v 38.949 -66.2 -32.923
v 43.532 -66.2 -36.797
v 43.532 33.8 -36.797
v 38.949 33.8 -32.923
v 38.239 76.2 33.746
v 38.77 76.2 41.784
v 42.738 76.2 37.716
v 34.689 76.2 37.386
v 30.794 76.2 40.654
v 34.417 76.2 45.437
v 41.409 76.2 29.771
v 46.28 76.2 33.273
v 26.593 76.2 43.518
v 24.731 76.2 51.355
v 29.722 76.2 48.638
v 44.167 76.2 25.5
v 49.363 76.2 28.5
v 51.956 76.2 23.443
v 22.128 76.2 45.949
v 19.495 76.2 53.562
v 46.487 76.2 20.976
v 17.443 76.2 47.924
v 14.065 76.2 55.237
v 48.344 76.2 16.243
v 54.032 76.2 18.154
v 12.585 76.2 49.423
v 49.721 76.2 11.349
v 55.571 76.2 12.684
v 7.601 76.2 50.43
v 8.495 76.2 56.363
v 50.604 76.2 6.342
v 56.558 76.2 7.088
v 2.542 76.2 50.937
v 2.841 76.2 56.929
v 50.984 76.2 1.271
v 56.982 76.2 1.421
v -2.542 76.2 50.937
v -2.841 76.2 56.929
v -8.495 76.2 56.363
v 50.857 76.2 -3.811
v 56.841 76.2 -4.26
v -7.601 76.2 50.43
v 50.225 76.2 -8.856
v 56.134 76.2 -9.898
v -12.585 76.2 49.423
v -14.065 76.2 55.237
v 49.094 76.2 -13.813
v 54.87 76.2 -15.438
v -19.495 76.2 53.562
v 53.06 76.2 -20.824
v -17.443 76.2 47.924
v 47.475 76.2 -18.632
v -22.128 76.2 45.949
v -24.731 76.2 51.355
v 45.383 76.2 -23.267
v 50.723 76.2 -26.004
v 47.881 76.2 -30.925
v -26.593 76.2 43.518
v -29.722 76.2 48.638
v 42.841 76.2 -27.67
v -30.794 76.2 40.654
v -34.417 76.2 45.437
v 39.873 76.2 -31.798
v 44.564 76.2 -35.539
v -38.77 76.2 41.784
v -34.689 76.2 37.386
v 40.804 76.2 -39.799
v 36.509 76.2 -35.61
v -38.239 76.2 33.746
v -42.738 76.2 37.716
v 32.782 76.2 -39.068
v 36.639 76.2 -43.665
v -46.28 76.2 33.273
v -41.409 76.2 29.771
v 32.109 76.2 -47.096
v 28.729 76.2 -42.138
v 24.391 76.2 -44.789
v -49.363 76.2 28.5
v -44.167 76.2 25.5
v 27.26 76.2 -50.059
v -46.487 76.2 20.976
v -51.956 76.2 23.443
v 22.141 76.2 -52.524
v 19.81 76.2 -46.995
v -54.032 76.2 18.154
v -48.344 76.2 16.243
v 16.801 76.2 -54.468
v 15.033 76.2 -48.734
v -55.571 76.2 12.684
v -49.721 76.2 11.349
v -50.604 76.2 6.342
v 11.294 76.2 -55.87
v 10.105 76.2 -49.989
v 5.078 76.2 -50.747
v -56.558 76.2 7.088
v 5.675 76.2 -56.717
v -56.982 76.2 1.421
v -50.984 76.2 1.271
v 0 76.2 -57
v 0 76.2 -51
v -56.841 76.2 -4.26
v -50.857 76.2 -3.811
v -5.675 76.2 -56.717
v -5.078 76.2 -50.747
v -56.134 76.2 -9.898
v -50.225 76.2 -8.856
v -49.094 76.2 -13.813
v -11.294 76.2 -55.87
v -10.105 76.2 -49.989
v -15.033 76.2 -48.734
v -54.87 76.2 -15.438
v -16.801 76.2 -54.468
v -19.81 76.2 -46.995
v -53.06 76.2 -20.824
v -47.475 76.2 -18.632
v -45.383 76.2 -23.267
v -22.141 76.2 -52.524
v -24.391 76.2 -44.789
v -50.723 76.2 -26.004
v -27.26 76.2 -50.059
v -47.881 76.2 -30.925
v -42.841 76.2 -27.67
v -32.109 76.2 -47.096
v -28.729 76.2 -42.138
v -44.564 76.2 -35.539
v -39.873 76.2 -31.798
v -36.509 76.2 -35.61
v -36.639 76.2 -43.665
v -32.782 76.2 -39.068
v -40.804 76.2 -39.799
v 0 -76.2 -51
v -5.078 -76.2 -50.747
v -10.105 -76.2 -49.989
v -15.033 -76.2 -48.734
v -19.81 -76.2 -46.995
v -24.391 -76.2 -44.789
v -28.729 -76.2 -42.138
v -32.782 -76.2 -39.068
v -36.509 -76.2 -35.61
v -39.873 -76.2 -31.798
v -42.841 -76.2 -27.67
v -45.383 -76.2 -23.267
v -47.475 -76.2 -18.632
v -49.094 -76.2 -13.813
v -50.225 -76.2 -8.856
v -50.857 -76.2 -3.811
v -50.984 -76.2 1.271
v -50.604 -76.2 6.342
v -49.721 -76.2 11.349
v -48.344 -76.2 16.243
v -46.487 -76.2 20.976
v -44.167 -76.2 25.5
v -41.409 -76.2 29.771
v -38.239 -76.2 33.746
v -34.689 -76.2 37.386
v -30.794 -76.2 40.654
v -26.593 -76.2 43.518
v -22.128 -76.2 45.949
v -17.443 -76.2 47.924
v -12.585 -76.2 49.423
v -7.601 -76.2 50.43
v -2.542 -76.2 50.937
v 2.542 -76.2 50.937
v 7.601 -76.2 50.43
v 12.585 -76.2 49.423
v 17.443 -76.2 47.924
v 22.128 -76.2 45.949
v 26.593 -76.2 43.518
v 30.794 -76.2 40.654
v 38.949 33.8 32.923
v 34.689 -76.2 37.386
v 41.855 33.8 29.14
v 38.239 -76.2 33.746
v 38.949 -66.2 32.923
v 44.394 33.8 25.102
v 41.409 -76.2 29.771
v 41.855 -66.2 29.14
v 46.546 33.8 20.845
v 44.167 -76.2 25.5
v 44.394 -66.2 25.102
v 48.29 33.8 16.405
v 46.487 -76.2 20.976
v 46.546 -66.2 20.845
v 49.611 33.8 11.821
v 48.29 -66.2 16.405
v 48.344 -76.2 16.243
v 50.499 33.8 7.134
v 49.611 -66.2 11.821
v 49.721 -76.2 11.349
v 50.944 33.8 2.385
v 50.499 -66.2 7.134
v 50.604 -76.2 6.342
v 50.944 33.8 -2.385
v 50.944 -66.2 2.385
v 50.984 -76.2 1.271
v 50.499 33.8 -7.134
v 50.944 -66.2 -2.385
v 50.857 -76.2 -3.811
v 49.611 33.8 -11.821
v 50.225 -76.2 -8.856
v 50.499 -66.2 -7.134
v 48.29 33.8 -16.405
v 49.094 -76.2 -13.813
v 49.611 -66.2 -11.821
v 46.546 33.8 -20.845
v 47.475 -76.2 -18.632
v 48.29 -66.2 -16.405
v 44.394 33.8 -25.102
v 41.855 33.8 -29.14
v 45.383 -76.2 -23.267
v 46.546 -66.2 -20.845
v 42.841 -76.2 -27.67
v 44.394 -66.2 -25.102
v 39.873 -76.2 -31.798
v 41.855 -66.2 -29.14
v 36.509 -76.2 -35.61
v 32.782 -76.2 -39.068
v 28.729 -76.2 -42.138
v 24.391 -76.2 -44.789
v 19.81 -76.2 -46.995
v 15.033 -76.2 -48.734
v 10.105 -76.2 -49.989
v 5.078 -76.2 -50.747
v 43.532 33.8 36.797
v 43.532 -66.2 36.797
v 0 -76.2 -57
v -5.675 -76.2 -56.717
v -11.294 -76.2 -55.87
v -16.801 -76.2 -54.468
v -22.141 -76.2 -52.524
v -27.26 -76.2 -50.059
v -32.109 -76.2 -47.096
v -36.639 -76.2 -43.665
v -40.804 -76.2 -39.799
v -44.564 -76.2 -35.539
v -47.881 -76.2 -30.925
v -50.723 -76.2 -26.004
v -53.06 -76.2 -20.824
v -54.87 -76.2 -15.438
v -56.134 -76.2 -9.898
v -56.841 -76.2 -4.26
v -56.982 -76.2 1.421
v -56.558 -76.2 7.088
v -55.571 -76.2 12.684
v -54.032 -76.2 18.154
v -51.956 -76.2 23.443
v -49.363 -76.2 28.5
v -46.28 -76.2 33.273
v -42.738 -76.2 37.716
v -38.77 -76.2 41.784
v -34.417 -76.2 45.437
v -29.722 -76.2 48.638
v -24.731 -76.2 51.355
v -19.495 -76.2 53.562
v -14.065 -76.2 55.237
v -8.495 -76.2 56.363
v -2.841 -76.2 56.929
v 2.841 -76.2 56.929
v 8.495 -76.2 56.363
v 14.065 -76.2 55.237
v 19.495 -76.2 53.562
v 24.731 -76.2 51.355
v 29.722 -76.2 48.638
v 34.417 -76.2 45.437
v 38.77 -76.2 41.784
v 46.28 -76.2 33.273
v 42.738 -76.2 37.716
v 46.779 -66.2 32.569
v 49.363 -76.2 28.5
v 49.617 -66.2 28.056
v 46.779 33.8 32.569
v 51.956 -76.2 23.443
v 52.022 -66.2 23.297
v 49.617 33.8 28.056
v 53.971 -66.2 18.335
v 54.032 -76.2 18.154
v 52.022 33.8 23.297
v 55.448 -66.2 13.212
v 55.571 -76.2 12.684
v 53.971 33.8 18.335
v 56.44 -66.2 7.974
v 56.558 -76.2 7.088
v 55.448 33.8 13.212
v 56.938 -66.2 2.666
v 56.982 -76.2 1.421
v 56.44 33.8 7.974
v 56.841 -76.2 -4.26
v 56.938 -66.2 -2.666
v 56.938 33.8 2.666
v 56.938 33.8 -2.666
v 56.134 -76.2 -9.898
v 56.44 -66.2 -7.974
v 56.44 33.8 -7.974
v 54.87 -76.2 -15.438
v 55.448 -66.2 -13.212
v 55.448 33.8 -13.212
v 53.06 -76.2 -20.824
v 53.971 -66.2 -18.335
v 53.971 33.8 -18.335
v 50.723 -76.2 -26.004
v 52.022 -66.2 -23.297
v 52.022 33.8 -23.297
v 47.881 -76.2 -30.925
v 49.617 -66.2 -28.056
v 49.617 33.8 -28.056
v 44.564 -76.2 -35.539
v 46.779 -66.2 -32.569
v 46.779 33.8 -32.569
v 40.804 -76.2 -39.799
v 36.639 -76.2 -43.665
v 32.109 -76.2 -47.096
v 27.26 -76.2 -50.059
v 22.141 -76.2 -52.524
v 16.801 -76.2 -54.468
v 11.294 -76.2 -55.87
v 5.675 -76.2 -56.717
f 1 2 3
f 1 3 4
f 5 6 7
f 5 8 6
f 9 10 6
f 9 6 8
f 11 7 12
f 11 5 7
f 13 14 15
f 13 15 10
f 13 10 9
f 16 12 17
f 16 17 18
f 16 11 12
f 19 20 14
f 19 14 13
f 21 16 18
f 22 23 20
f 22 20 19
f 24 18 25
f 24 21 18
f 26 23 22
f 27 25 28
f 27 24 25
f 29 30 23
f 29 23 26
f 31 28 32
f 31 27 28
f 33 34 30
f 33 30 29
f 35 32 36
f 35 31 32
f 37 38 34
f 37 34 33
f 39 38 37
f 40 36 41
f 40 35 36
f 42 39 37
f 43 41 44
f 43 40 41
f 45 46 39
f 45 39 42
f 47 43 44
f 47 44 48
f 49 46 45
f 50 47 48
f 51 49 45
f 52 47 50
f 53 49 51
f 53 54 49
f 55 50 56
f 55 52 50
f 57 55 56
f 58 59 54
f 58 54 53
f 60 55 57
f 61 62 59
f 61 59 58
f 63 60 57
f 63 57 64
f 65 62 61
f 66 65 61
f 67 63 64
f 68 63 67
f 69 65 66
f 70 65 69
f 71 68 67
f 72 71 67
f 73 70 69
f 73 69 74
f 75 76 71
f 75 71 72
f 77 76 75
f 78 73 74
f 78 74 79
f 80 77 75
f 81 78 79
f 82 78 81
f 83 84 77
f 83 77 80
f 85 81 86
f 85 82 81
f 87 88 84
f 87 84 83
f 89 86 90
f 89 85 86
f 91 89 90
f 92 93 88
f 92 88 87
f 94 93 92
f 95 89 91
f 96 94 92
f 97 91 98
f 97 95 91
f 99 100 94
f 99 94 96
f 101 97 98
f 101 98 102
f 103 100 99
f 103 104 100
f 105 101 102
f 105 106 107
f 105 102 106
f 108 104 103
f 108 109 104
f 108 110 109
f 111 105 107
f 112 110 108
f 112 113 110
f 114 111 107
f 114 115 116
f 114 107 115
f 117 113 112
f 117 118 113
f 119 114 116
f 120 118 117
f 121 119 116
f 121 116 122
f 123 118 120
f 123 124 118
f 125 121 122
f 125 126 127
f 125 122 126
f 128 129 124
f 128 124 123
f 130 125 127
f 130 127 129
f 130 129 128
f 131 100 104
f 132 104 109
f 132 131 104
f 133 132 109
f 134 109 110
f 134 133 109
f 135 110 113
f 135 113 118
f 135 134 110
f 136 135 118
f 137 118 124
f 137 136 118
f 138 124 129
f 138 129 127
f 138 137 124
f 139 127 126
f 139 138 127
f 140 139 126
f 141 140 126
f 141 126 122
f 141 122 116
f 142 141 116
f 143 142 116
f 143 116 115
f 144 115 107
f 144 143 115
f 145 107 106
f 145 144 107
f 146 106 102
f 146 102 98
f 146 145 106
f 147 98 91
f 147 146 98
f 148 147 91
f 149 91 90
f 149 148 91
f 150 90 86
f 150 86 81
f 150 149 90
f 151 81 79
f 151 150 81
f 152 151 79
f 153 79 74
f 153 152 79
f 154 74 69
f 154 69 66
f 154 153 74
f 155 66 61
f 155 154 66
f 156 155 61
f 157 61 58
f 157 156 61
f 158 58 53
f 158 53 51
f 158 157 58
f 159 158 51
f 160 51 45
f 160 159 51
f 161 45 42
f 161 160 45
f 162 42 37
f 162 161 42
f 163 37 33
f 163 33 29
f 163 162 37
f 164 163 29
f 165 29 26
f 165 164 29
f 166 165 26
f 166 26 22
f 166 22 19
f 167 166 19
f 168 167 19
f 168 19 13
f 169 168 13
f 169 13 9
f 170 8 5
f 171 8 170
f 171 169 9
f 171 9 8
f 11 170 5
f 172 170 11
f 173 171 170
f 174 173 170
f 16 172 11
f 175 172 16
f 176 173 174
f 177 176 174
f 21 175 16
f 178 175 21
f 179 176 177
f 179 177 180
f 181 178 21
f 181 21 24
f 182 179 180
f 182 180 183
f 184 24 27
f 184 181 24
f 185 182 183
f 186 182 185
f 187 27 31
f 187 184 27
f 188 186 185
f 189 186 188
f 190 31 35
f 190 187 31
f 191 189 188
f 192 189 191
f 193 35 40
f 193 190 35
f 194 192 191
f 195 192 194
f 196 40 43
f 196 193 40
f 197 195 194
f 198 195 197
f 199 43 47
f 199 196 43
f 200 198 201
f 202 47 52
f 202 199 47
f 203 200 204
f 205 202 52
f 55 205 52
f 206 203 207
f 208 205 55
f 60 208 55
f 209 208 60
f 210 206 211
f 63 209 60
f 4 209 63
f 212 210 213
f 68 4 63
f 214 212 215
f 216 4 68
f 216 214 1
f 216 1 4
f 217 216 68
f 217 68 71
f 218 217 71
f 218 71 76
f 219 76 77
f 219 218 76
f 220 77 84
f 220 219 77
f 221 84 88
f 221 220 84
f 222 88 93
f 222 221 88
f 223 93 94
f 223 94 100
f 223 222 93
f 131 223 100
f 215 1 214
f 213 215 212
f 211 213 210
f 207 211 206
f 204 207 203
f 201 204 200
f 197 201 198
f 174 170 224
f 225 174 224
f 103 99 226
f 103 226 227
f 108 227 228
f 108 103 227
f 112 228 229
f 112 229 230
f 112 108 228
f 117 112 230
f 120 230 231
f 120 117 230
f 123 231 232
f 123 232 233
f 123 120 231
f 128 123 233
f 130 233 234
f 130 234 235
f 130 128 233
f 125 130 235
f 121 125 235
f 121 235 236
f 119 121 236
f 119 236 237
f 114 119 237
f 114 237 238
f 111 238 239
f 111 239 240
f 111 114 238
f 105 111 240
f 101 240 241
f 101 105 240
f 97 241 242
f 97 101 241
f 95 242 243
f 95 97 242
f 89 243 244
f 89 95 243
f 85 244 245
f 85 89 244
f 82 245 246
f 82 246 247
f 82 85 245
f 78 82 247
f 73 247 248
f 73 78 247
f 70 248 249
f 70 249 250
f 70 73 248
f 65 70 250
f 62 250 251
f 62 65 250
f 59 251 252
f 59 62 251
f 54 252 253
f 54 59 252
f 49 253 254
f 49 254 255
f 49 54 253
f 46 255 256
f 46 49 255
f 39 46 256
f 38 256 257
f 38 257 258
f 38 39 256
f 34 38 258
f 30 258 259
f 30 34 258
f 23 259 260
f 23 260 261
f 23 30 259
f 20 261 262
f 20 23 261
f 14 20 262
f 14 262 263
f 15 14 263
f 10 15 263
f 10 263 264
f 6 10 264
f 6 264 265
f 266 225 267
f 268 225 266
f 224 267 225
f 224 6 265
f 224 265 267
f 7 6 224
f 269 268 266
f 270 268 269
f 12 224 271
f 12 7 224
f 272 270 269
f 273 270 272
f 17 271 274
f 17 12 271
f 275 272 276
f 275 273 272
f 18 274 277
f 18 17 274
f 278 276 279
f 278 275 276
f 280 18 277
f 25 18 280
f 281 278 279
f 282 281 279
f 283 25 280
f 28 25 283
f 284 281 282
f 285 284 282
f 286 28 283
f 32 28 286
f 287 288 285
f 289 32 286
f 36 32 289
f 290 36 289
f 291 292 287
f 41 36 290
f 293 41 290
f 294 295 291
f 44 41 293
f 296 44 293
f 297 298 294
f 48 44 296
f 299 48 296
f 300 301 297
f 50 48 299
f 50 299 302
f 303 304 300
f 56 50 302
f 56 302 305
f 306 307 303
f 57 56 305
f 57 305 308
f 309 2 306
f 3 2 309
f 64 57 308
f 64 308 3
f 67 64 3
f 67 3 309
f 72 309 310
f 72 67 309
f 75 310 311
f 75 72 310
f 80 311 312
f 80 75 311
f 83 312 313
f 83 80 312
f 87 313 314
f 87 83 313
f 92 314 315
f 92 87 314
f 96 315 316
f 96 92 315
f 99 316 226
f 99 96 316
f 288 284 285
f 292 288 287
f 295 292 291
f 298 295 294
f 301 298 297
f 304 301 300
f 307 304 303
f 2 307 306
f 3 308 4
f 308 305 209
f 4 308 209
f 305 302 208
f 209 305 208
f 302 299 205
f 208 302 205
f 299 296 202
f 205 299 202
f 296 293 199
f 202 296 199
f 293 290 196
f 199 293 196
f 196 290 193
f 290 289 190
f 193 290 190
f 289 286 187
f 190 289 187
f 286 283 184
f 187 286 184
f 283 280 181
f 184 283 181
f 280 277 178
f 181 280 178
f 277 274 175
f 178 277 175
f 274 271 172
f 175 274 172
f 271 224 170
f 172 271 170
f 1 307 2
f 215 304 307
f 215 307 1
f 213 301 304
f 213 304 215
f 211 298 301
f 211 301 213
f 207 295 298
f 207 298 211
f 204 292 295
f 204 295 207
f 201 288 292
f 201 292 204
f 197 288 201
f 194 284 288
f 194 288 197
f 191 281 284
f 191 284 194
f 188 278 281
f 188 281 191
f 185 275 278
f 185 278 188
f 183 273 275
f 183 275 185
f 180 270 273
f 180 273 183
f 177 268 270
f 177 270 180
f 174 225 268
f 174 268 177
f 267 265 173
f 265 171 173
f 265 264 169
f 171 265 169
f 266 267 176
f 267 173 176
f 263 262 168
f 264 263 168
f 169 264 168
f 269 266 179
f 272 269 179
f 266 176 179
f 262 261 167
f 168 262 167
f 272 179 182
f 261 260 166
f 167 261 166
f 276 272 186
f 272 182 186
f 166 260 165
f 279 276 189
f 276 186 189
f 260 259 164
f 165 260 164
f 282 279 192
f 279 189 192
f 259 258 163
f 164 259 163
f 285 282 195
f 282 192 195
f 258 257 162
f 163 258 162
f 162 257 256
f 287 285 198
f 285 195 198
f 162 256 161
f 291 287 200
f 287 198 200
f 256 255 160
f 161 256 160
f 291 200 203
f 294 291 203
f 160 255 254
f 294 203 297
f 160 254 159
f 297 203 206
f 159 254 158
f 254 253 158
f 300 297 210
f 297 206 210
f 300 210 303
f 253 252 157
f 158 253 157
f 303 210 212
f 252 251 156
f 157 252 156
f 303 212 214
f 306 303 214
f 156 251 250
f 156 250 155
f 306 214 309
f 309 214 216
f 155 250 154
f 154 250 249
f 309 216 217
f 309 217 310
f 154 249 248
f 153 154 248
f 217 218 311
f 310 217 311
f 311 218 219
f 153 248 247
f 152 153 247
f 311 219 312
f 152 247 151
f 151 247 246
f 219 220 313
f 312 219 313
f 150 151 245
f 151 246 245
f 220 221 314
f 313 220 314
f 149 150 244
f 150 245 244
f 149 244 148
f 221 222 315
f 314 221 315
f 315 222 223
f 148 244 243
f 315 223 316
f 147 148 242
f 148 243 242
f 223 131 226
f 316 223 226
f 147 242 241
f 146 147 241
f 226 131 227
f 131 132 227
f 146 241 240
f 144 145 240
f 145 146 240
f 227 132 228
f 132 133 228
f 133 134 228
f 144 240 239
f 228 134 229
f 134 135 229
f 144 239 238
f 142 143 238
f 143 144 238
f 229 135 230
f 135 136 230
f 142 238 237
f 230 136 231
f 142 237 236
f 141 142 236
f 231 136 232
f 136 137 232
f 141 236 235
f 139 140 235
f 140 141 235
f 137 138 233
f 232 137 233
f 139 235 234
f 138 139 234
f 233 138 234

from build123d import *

# Parameters (mm, degrees)
PVC_R               = 57
PVC_R_2             = 51
BOSS_EXTRUDE1_DEPTH = 76.2
CUT_EXTRUDE1_START  = -110
CUT_EXTRUDE1_DEPTH  = 100


with BuildPart() as part:
    # PVC → Boss-Extrude1 (new, symmetric)
    with BuildSketch(Plane(origin=(0, 0, 0), x_dir=(1, 0, 0), z_dir=(0, 1, 0))):
        with Locations(Location((0, 0, 0), (0, 0, 90))):
            Circle(PVC_R)
        with Locations(Location((0, 0, 0), (0, 0, 90))):
            Circle(PVC_R_2, mode=Mode.SUBTRACT)
    extrude(amount=BOSS_EXTRUDE1_DEPTH, both=True)

    # Sketch1 → Cut-Extrude1 (cut)
    with BuildSketch(Plane.XZ.offset(76.2).offset(CUT_EXTRUDE1_START)):
        with BuildLine():
            Line((0, 0), (43.531515848, 36.796835842))
            ThreePointArc((43.531515848, 36.796835842), (57, 0), (43.531515848, -36.796835842))
            Line((43.531515848, -36.796835842), (0, 0))
        make_face()
    extrude(amount=CUT_EXTRUDE1_DEPTH, mode=Mode.SUBTRACT)


solid = part.part
